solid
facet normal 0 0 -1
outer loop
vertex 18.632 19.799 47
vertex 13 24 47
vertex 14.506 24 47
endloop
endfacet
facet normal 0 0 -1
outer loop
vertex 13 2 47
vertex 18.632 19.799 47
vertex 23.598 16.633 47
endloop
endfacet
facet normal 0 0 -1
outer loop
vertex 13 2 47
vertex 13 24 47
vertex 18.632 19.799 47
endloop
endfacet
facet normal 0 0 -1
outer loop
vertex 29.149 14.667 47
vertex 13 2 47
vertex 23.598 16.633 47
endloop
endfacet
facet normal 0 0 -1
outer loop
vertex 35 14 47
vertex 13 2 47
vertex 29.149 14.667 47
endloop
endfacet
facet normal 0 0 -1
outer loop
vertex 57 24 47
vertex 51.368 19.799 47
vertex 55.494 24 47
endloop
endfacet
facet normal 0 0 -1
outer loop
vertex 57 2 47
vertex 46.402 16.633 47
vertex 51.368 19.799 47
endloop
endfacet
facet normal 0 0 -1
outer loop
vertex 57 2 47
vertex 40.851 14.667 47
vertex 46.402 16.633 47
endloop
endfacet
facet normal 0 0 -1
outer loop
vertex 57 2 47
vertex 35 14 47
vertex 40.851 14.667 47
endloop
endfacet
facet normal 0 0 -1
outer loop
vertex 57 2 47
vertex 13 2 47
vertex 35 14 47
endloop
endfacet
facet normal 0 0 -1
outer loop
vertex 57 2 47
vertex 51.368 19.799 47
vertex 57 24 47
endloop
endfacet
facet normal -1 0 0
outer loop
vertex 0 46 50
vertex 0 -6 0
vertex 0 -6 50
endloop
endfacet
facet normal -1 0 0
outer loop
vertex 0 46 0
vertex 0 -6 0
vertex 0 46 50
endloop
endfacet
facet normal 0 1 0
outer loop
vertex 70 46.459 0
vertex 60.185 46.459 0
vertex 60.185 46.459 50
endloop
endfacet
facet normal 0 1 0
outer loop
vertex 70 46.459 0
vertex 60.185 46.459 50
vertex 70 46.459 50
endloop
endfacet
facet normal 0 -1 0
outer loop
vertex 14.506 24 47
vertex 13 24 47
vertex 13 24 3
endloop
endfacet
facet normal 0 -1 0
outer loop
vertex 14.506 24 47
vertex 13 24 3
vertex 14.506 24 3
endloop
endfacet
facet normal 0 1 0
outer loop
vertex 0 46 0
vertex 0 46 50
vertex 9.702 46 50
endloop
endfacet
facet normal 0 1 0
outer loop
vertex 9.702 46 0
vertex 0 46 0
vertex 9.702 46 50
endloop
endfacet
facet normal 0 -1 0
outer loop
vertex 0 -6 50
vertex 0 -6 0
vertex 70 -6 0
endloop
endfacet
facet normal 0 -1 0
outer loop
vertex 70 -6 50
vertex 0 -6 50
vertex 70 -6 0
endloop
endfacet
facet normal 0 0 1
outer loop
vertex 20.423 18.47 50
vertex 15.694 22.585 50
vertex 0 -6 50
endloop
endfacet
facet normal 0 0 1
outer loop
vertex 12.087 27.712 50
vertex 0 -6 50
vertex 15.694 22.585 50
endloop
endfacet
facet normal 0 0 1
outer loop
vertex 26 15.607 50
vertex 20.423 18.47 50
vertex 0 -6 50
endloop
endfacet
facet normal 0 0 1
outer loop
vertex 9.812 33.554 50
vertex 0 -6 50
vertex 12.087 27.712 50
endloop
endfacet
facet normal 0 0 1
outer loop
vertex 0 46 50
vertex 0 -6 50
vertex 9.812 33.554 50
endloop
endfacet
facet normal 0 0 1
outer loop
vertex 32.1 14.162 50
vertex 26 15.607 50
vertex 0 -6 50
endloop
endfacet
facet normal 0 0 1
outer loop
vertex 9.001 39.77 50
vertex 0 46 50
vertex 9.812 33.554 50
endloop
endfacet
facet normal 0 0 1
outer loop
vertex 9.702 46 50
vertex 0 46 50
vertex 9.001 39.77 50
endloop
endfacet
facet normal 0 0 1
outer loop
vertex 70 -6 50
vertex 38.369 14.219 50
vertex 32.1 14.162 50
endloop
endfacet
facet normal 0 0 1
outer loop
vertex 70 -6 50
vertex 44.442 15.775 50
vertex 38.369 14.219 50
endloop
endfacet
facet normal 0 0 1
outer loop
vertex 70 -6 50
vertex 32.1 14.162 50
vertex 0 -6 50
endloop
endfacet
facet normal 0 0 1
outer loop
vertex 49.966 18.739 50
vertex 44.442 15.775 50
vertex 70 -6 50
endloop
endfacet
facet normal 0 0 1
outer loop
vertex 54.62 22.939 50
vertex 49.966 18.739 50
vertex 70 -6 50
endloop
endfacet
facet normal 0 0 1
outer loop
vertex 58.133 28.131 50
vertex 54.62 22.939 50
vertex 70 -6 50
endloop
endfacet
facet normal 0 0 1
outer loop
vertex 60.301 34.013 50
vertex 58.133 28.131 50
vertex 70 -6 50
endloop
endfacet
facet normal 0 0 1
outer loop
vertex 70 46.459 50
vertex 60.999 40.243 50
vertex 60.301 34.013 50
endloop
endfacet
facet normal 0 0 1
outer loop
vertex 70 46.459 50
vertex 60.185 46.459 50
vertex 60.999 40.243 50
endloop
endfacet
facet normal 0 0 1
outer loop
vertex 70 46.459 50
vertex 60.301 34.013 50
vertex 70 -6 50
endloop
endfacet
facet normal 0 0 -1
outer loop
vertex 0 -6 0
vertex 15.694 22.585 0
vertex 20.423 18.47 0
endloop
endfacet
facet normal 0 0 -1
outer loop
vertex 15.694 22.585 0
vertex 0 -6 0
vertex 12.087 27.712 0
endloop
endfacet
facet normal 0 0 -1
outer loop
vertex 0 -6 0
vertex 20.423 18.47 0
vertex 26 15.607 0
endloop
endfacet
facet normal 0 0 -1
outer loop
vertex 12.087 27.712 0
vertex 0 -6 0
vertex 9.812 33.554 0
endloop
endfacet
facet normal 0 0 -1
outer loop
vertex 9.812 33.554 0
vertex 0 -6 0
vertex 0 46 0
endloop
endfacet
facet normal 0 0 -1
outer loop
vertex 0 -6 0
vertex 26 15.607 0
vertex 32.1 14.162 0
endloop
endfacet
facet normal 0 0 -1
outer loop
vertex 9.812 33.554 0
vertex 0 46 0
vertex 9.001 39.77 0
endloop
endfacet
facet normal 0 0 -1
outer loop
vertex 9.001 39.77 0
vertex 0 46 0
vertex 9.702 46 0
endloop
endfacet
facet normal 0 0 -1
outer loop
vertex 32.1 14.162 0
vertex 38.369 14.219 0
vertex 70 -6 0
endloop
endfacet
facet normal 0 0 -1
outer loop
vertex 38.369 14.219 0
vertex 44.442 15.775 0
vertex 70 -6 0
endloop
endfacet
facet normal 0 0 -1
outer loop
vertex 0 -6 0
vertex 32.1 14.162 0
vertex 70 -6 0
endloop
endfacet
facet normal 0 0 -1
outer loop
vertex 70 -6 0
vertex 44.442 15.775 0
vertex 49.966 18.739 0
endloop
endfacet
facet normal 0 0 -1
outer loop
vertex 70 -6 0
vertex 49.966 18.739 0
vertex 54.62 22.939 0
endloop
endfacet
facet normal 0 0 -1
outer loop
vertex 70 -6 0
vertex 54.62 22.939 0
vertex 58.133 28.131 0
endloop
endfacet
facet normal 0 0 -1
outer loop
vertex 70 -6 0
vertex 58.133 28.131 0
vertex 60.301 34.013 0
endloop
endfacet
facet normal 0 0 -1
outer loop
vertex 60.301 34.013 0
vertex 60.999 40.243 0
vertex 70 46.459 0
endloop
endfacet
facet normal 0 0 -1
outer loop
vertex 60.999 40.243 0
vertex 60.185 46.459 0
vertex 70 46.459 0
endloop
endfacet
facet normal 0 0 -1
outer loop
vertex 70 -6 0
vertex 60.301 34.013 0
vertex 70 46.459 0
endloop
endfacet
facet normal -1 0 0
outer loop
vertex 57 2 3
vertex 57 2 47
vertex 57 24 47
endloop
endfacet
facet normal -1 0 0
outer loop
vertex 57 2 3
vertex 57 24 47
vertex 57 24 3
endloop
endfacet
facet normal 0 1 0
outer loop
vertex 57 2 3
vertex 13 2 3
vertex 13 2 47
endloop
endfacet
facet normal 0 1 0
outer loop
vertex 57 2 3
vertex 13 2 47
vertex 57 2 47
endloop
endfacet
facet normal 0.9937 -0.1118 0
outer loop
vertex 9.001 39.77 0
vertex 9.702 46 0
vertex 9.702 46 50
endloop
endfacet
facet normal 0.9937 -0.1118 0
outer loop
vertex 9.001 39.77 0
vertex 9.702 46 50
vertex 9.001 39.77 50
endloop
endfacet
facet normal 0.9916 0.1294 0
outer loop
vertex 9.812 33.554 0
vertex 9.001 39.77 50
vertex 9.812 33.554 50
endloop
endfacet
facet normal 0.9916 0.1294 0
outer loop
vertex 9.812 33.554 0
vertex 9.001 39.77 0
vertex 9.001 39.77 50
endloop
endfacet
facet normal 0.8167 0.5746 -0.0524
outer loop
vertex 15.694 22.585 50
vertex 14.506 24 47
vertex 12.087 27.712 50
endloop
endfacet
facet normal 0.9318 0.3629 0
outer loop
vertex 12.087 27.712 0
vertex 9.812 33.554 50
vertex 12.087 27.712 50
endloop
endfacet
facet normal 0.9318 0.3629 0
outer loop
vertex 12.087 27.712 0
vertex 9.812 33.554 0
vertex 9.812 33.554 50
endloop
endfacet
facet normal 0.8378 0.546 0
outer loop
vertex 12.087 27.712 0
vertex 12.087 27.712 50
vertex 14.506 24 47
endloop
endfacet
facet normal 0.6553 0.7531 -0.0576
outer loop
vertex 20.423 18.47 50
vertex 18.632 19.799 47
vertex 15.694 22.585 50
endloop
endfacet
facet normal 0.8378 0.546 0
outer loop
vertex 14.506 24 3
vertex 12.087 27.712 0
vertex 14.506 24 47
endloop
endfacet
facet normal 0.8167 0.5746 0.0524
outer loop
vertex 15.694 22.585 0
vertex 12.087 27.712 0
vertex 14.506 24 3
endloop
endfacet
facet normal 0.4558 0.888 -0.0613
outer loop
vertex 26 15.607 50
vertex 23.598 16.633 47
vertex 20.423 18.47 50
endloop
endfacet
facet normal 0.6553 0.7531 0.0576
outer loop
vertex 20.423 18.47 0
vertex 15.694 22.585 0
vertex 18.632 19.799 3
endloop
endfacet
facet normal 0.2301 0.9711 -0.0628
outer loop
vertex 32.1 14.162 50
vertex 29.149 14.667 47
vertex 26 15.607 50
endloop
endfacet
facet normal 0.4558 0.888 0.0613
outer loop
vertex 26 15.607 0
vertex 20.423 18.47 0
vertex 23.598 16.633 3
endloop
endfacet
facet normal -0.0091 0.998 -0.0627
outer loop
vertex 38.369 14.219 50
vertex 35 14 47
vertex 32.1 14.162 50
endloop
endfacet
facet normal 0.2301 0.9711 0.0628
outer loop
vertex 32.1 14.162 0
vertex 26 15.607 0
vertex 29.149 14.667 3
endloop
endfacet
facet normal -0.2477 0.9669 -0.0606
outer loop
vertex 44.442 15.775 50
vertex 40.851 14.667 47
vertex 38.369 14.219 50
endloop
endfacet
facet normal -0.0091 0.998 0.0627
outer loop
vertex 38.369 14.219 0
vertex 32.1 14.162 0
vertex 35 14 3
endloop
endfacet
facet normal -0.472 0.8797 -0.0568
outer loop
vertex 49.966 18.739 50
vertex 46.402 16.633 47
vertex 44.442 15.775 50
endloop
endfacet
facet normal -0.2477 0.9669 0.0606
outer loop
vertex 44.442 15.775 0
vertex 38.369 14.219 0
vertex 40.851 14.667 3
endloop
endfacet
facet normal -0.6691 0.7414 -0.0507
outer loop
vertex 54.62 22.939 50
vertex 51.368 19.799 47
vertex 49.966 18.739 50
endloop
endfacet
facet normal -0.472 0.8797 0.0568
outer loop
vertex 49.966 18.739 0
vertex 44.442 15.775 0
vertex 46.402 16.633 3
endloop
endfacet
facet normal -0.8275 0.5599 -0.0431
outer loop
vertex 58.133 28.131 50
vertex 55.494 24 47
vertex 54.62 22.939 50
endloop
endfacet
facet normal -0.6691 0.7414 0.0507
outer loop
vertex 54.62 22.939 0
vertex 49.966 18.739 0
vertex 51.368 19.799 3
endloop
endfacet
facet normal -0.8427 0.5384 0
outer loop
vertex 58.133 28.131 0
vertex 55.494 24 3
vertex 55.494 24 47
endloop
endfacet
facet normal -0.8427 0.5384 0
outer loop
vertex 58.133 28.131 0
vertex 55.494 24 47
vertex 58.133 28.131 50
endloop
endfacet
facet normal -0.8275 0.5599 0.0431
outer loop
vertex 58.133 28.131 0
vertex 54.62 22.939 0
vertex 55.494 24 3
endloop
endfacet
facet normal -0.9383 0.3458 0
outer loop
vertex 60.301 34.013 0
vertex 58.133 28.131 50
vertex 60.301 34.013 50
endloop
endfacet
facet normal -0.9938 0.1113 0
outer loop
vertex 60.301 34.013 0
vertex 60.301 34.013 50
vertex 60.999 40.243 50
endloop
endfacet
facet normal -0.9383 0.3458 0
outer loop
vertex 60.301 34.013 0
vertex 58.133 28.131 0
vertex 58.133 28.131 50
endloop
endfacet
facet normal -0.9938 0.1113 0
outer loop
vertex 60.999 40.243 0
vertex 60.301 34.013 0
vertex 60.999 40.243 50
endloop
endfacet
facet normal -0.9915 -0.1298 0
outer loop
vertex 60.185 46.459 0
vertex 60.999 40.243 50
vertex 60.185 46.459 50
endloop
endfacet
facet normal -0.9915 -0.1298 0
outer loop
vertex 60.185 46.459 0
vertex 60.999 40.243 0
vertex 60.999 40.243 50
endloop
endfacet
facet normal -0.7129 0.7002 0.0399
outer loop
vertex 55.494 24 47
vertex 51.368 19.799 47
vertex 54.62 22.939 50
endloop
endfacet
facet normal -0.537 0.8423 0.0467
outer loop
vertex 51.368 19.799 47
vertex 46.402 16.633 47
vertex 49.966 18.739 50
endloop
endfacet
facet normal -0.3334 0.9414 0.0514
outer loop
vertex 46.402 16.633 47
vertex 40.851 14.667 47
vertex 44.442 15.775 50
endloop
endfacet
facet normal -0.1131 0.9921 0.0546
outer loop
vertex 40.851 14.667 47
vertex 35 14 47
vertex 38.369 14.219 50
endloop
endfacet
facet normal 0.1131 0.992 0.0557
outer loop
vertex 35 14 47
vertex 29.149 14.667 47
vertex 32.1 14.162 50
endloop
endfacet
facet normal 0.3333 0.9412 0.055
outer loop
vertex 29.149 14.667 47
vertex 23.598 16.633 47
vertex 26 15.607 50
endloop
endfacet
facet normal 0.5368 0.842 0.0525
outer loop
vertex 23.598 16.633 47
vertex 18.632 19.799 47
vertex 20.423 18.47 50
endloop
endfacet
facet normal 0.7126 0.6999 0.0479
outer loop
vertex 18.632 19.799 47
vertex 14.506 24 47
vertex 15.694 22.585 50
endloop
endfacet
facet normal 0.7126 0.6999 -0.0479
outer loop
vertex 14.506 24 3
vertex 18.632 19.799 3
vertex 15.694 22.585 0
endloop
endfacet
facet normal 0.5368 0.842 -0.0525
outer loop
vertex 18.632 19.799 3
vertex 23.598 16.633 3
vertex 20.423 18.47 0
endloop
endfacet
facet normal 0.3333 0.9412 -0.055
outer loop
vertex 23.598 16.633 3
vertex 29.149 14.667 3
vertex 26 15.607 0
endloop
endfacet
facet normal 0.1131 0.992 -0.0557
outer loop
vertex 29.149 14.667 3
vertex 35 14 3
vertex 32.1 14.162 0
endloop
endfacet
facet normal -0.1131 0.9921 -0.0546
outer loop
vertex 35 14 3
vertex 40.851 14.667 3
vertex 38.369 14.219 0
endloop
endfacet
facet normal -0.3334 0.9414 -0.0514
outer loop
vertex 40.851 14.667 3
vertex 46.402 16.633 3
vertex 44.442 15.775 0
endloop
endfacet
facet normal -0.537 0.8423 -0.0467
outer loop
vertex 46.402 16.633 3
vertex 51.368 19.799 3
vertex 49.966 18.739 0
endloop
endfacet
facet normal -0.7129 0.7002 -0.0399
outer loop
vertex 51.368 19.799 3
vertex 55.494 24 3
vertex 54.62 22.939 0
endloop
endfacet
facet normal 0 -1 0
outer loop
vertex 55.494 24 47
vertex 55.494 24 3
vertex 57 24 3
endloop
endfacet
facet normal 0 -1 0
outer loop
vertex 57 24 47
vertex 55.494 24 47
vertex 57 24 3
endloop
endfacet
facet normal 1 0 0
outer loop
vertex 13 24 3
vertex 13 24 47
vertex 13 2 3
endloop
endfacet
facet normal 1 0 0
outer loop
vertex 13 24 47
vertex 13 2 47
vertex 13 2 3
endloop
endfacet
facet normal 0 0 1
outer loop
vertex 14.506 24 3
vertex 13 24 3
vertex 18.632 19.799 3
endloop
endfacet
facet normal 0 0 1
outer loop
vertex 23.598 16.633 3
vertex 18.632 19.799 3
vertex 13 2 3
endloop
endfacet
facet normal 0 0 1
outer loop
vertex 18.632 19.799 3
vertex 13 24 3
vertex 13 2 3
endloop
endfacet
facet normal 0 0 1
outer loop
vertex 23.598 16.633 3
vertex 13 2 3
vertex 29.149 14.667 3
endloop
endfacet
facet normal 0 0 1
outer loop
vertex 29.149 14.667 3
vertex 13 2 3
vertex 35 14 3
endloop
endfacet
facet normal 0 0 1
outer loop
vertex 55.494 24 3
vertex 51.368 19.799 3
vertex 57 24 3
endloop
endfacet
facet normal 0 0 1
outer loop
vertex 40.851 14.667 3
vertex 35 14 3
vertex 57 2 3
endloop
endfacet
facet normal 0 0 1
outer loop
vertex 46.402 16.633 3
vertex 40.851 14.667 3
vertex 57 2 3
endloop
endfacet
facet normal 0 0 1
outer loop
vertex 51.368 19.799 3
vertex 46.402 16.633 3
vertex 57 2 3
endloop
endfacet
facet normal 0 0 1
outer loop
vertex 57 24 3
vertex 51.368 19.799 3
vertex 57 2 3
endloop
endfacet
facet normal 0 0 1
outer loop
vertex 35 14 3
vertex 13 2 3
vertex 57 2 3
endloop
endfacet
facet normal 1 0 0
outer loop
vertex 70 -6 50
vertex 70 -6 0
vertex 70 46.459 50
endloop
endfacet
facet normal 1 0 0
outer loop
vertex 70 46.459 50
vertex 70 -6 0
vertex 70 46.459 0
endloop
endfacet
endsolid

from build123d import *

# Parameters (mm, degrees)
SKETCH1_W           = 70
SKETCH1_H           = 10
BOSS_EXTRUDE2_DEPTH = 50
SKETCH2_W           = 44
SKETCH2_H           = 44
CUT_EXTRUDE6_DEPTH  = 10
SKETCH3_W           = 44
SKETCH3_H           = 44
CUT_EXTRUDE8_DEPTH  = 12
SKETCH6_W           = 70
SKETCH6_H           = 6
BOSS_EXTRUDE3_DEPTH = 50


with BuildPart() as part:
    # Sketch1 → Boss-Extrude2 (new body)
    with BuildSketch(Plane.XY):
        with BuildLine():
            Line((60.184895573, 46.459182221), (70, 46.459182221))
            Line((70, 46.459182221), (70, 10))
            Line((70, 10), (0, 10))
            Line((0, 10), (0, 46))
            Line((0, 46), (9.701778719, 46))
            ThreePointArc((9.701778719, 46), (35.236479929, 14.00107546), (60.184895573, 46.459182221))
        make_face()
        with Locations((35, 5)):
            Rectangle(SKETCH1_W, SKETCH1_H)
    extrude(amount=BOSS_EXTRUDE2_DEPTH)

    # Sketch2 → Cut-Extrude6 (cut)
    with BuildSketch(Plane(origin=(0, 14, 0), x_dir=(1, 0, 0), z_dir=(0, 1, 0))):
        with Locations((35, -25)):
            Rectangle(SKETCH2_W, SKETCH2_H)
    extrude(amount=CUT_EXTRUDE6_DEPTH, mode=Mode.SUBTRACT)

    # Sketch3 → Cut-Extrude8 (cut)
    with BuildSketch(Plane(origin=(0, 14, 0), x_dir=(1, 0, 0), z_dir=(0, 1, 0))):
        with Locations((35, -25)):
            Rectangle(SKETCH3_W, SKETCH3_H)
    extrude(amount=-CUT_EXTRUDE8_DEPTH, mode=Mode.SUBTRACT)

    # Sketch6 → Boss-Extrude3 (add)
    with BuildSketch(Plane.XY):
        with Locations((35, -3)):
            Rectangle(SKETCH6_W, SKETCH6_H)
    extrude(amount=BOSS_EXTRUDE3_DEPTH)


solid = part.part
